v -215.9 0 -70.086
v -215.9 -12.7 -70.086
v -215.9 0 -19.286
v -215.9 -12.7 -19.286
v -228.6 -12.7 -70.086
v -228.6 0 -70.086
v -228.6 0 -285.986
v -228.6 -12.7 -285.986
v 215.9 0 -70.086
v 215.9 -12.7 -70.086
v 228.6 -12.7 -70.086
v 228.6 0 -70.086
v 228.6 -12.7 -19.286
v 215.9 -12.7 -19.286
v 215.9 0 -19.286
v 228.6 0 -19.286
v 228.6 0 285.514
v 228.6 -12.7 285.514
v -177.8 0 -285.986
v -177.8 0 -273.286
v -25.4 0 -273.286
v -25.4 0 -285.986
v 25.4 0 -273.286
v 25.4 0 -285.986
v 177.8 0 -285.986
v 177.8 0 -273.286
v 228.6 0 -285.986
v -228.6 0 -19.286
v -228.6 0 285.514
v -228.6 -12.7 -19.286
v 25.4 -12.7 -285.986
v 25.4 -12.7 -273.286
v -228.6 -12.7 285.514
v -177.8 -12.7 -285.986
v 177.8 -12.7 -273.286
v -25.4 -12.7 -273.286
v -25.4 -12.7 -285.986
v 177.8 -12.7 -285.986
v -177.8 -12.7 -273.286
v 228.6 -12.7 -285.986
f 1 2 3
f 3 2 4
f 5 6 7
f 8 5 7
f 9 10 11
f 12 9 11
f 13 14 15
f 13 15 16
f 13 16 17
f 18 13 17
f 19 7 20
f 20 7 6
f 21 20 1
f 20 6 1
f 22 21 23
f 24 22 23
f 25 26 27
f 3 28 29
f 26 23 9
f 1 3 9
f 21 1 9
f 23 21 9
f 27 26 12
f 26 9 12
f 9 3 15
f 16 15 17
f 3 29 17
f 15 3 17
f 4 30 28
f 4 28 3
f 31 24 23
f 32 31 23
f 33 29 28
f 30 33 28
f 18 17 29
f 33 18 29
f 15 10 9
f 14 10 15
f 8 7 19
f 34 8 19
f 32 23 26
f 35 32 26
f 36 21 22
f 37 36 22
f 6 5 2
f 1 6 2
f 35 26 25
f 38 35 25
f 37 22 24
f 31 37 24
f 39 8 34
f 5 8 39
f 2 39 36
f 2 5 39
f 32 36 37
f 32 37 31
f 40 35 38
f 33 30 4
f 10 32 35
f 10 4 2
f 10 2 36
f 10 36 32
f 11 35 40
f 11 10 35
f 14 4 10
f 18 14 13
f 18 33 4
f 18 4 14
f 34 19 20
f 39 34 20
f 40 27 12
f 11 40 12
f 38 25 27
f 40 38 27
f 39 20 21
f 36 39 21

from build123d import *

# Parameters (mm, degrees)
F1_DEPTH = 12.7
F2_W     = 12.7
F2_H     = 50.8
F3_DEPTH = 25.4


with BuildPart() as f1:
    # F0 (on Front) → F1 (new body)
    with BuildSketch(Plane.XZ):
        Polygon((25.4, -273.285884), (177.8, -273.285884), (177.8, -285.985884), (228.6, -285.985884), (228.6, -273.285884), (228.6, 285.514116), (-228.6, 285.514116), (-228.6, -273.285884), (-228.6, -285.985884), (-177.8, -285.985884), (-177.8, -273.285884), (-25.4, -273.285884), (-25.4, -285.985884), (25.4, -285.985884), align=None)
    extrude(amount=F1_DEPTH)

    # F2 (on face) → F3 (cut)
    with BuildSketch(Plane.XZ.offset(12.7)):
        with Locations((-222.25, -44.685884)):
            Rectangle(F2_W, F2_H)
        with Locations((222.25, -44.685884)):
            Rectangle(F2_W, F2_H)
    extrude(amount=-F3_DEPTH, mode=Mode.SUBTRACT)


solid = f1.part
